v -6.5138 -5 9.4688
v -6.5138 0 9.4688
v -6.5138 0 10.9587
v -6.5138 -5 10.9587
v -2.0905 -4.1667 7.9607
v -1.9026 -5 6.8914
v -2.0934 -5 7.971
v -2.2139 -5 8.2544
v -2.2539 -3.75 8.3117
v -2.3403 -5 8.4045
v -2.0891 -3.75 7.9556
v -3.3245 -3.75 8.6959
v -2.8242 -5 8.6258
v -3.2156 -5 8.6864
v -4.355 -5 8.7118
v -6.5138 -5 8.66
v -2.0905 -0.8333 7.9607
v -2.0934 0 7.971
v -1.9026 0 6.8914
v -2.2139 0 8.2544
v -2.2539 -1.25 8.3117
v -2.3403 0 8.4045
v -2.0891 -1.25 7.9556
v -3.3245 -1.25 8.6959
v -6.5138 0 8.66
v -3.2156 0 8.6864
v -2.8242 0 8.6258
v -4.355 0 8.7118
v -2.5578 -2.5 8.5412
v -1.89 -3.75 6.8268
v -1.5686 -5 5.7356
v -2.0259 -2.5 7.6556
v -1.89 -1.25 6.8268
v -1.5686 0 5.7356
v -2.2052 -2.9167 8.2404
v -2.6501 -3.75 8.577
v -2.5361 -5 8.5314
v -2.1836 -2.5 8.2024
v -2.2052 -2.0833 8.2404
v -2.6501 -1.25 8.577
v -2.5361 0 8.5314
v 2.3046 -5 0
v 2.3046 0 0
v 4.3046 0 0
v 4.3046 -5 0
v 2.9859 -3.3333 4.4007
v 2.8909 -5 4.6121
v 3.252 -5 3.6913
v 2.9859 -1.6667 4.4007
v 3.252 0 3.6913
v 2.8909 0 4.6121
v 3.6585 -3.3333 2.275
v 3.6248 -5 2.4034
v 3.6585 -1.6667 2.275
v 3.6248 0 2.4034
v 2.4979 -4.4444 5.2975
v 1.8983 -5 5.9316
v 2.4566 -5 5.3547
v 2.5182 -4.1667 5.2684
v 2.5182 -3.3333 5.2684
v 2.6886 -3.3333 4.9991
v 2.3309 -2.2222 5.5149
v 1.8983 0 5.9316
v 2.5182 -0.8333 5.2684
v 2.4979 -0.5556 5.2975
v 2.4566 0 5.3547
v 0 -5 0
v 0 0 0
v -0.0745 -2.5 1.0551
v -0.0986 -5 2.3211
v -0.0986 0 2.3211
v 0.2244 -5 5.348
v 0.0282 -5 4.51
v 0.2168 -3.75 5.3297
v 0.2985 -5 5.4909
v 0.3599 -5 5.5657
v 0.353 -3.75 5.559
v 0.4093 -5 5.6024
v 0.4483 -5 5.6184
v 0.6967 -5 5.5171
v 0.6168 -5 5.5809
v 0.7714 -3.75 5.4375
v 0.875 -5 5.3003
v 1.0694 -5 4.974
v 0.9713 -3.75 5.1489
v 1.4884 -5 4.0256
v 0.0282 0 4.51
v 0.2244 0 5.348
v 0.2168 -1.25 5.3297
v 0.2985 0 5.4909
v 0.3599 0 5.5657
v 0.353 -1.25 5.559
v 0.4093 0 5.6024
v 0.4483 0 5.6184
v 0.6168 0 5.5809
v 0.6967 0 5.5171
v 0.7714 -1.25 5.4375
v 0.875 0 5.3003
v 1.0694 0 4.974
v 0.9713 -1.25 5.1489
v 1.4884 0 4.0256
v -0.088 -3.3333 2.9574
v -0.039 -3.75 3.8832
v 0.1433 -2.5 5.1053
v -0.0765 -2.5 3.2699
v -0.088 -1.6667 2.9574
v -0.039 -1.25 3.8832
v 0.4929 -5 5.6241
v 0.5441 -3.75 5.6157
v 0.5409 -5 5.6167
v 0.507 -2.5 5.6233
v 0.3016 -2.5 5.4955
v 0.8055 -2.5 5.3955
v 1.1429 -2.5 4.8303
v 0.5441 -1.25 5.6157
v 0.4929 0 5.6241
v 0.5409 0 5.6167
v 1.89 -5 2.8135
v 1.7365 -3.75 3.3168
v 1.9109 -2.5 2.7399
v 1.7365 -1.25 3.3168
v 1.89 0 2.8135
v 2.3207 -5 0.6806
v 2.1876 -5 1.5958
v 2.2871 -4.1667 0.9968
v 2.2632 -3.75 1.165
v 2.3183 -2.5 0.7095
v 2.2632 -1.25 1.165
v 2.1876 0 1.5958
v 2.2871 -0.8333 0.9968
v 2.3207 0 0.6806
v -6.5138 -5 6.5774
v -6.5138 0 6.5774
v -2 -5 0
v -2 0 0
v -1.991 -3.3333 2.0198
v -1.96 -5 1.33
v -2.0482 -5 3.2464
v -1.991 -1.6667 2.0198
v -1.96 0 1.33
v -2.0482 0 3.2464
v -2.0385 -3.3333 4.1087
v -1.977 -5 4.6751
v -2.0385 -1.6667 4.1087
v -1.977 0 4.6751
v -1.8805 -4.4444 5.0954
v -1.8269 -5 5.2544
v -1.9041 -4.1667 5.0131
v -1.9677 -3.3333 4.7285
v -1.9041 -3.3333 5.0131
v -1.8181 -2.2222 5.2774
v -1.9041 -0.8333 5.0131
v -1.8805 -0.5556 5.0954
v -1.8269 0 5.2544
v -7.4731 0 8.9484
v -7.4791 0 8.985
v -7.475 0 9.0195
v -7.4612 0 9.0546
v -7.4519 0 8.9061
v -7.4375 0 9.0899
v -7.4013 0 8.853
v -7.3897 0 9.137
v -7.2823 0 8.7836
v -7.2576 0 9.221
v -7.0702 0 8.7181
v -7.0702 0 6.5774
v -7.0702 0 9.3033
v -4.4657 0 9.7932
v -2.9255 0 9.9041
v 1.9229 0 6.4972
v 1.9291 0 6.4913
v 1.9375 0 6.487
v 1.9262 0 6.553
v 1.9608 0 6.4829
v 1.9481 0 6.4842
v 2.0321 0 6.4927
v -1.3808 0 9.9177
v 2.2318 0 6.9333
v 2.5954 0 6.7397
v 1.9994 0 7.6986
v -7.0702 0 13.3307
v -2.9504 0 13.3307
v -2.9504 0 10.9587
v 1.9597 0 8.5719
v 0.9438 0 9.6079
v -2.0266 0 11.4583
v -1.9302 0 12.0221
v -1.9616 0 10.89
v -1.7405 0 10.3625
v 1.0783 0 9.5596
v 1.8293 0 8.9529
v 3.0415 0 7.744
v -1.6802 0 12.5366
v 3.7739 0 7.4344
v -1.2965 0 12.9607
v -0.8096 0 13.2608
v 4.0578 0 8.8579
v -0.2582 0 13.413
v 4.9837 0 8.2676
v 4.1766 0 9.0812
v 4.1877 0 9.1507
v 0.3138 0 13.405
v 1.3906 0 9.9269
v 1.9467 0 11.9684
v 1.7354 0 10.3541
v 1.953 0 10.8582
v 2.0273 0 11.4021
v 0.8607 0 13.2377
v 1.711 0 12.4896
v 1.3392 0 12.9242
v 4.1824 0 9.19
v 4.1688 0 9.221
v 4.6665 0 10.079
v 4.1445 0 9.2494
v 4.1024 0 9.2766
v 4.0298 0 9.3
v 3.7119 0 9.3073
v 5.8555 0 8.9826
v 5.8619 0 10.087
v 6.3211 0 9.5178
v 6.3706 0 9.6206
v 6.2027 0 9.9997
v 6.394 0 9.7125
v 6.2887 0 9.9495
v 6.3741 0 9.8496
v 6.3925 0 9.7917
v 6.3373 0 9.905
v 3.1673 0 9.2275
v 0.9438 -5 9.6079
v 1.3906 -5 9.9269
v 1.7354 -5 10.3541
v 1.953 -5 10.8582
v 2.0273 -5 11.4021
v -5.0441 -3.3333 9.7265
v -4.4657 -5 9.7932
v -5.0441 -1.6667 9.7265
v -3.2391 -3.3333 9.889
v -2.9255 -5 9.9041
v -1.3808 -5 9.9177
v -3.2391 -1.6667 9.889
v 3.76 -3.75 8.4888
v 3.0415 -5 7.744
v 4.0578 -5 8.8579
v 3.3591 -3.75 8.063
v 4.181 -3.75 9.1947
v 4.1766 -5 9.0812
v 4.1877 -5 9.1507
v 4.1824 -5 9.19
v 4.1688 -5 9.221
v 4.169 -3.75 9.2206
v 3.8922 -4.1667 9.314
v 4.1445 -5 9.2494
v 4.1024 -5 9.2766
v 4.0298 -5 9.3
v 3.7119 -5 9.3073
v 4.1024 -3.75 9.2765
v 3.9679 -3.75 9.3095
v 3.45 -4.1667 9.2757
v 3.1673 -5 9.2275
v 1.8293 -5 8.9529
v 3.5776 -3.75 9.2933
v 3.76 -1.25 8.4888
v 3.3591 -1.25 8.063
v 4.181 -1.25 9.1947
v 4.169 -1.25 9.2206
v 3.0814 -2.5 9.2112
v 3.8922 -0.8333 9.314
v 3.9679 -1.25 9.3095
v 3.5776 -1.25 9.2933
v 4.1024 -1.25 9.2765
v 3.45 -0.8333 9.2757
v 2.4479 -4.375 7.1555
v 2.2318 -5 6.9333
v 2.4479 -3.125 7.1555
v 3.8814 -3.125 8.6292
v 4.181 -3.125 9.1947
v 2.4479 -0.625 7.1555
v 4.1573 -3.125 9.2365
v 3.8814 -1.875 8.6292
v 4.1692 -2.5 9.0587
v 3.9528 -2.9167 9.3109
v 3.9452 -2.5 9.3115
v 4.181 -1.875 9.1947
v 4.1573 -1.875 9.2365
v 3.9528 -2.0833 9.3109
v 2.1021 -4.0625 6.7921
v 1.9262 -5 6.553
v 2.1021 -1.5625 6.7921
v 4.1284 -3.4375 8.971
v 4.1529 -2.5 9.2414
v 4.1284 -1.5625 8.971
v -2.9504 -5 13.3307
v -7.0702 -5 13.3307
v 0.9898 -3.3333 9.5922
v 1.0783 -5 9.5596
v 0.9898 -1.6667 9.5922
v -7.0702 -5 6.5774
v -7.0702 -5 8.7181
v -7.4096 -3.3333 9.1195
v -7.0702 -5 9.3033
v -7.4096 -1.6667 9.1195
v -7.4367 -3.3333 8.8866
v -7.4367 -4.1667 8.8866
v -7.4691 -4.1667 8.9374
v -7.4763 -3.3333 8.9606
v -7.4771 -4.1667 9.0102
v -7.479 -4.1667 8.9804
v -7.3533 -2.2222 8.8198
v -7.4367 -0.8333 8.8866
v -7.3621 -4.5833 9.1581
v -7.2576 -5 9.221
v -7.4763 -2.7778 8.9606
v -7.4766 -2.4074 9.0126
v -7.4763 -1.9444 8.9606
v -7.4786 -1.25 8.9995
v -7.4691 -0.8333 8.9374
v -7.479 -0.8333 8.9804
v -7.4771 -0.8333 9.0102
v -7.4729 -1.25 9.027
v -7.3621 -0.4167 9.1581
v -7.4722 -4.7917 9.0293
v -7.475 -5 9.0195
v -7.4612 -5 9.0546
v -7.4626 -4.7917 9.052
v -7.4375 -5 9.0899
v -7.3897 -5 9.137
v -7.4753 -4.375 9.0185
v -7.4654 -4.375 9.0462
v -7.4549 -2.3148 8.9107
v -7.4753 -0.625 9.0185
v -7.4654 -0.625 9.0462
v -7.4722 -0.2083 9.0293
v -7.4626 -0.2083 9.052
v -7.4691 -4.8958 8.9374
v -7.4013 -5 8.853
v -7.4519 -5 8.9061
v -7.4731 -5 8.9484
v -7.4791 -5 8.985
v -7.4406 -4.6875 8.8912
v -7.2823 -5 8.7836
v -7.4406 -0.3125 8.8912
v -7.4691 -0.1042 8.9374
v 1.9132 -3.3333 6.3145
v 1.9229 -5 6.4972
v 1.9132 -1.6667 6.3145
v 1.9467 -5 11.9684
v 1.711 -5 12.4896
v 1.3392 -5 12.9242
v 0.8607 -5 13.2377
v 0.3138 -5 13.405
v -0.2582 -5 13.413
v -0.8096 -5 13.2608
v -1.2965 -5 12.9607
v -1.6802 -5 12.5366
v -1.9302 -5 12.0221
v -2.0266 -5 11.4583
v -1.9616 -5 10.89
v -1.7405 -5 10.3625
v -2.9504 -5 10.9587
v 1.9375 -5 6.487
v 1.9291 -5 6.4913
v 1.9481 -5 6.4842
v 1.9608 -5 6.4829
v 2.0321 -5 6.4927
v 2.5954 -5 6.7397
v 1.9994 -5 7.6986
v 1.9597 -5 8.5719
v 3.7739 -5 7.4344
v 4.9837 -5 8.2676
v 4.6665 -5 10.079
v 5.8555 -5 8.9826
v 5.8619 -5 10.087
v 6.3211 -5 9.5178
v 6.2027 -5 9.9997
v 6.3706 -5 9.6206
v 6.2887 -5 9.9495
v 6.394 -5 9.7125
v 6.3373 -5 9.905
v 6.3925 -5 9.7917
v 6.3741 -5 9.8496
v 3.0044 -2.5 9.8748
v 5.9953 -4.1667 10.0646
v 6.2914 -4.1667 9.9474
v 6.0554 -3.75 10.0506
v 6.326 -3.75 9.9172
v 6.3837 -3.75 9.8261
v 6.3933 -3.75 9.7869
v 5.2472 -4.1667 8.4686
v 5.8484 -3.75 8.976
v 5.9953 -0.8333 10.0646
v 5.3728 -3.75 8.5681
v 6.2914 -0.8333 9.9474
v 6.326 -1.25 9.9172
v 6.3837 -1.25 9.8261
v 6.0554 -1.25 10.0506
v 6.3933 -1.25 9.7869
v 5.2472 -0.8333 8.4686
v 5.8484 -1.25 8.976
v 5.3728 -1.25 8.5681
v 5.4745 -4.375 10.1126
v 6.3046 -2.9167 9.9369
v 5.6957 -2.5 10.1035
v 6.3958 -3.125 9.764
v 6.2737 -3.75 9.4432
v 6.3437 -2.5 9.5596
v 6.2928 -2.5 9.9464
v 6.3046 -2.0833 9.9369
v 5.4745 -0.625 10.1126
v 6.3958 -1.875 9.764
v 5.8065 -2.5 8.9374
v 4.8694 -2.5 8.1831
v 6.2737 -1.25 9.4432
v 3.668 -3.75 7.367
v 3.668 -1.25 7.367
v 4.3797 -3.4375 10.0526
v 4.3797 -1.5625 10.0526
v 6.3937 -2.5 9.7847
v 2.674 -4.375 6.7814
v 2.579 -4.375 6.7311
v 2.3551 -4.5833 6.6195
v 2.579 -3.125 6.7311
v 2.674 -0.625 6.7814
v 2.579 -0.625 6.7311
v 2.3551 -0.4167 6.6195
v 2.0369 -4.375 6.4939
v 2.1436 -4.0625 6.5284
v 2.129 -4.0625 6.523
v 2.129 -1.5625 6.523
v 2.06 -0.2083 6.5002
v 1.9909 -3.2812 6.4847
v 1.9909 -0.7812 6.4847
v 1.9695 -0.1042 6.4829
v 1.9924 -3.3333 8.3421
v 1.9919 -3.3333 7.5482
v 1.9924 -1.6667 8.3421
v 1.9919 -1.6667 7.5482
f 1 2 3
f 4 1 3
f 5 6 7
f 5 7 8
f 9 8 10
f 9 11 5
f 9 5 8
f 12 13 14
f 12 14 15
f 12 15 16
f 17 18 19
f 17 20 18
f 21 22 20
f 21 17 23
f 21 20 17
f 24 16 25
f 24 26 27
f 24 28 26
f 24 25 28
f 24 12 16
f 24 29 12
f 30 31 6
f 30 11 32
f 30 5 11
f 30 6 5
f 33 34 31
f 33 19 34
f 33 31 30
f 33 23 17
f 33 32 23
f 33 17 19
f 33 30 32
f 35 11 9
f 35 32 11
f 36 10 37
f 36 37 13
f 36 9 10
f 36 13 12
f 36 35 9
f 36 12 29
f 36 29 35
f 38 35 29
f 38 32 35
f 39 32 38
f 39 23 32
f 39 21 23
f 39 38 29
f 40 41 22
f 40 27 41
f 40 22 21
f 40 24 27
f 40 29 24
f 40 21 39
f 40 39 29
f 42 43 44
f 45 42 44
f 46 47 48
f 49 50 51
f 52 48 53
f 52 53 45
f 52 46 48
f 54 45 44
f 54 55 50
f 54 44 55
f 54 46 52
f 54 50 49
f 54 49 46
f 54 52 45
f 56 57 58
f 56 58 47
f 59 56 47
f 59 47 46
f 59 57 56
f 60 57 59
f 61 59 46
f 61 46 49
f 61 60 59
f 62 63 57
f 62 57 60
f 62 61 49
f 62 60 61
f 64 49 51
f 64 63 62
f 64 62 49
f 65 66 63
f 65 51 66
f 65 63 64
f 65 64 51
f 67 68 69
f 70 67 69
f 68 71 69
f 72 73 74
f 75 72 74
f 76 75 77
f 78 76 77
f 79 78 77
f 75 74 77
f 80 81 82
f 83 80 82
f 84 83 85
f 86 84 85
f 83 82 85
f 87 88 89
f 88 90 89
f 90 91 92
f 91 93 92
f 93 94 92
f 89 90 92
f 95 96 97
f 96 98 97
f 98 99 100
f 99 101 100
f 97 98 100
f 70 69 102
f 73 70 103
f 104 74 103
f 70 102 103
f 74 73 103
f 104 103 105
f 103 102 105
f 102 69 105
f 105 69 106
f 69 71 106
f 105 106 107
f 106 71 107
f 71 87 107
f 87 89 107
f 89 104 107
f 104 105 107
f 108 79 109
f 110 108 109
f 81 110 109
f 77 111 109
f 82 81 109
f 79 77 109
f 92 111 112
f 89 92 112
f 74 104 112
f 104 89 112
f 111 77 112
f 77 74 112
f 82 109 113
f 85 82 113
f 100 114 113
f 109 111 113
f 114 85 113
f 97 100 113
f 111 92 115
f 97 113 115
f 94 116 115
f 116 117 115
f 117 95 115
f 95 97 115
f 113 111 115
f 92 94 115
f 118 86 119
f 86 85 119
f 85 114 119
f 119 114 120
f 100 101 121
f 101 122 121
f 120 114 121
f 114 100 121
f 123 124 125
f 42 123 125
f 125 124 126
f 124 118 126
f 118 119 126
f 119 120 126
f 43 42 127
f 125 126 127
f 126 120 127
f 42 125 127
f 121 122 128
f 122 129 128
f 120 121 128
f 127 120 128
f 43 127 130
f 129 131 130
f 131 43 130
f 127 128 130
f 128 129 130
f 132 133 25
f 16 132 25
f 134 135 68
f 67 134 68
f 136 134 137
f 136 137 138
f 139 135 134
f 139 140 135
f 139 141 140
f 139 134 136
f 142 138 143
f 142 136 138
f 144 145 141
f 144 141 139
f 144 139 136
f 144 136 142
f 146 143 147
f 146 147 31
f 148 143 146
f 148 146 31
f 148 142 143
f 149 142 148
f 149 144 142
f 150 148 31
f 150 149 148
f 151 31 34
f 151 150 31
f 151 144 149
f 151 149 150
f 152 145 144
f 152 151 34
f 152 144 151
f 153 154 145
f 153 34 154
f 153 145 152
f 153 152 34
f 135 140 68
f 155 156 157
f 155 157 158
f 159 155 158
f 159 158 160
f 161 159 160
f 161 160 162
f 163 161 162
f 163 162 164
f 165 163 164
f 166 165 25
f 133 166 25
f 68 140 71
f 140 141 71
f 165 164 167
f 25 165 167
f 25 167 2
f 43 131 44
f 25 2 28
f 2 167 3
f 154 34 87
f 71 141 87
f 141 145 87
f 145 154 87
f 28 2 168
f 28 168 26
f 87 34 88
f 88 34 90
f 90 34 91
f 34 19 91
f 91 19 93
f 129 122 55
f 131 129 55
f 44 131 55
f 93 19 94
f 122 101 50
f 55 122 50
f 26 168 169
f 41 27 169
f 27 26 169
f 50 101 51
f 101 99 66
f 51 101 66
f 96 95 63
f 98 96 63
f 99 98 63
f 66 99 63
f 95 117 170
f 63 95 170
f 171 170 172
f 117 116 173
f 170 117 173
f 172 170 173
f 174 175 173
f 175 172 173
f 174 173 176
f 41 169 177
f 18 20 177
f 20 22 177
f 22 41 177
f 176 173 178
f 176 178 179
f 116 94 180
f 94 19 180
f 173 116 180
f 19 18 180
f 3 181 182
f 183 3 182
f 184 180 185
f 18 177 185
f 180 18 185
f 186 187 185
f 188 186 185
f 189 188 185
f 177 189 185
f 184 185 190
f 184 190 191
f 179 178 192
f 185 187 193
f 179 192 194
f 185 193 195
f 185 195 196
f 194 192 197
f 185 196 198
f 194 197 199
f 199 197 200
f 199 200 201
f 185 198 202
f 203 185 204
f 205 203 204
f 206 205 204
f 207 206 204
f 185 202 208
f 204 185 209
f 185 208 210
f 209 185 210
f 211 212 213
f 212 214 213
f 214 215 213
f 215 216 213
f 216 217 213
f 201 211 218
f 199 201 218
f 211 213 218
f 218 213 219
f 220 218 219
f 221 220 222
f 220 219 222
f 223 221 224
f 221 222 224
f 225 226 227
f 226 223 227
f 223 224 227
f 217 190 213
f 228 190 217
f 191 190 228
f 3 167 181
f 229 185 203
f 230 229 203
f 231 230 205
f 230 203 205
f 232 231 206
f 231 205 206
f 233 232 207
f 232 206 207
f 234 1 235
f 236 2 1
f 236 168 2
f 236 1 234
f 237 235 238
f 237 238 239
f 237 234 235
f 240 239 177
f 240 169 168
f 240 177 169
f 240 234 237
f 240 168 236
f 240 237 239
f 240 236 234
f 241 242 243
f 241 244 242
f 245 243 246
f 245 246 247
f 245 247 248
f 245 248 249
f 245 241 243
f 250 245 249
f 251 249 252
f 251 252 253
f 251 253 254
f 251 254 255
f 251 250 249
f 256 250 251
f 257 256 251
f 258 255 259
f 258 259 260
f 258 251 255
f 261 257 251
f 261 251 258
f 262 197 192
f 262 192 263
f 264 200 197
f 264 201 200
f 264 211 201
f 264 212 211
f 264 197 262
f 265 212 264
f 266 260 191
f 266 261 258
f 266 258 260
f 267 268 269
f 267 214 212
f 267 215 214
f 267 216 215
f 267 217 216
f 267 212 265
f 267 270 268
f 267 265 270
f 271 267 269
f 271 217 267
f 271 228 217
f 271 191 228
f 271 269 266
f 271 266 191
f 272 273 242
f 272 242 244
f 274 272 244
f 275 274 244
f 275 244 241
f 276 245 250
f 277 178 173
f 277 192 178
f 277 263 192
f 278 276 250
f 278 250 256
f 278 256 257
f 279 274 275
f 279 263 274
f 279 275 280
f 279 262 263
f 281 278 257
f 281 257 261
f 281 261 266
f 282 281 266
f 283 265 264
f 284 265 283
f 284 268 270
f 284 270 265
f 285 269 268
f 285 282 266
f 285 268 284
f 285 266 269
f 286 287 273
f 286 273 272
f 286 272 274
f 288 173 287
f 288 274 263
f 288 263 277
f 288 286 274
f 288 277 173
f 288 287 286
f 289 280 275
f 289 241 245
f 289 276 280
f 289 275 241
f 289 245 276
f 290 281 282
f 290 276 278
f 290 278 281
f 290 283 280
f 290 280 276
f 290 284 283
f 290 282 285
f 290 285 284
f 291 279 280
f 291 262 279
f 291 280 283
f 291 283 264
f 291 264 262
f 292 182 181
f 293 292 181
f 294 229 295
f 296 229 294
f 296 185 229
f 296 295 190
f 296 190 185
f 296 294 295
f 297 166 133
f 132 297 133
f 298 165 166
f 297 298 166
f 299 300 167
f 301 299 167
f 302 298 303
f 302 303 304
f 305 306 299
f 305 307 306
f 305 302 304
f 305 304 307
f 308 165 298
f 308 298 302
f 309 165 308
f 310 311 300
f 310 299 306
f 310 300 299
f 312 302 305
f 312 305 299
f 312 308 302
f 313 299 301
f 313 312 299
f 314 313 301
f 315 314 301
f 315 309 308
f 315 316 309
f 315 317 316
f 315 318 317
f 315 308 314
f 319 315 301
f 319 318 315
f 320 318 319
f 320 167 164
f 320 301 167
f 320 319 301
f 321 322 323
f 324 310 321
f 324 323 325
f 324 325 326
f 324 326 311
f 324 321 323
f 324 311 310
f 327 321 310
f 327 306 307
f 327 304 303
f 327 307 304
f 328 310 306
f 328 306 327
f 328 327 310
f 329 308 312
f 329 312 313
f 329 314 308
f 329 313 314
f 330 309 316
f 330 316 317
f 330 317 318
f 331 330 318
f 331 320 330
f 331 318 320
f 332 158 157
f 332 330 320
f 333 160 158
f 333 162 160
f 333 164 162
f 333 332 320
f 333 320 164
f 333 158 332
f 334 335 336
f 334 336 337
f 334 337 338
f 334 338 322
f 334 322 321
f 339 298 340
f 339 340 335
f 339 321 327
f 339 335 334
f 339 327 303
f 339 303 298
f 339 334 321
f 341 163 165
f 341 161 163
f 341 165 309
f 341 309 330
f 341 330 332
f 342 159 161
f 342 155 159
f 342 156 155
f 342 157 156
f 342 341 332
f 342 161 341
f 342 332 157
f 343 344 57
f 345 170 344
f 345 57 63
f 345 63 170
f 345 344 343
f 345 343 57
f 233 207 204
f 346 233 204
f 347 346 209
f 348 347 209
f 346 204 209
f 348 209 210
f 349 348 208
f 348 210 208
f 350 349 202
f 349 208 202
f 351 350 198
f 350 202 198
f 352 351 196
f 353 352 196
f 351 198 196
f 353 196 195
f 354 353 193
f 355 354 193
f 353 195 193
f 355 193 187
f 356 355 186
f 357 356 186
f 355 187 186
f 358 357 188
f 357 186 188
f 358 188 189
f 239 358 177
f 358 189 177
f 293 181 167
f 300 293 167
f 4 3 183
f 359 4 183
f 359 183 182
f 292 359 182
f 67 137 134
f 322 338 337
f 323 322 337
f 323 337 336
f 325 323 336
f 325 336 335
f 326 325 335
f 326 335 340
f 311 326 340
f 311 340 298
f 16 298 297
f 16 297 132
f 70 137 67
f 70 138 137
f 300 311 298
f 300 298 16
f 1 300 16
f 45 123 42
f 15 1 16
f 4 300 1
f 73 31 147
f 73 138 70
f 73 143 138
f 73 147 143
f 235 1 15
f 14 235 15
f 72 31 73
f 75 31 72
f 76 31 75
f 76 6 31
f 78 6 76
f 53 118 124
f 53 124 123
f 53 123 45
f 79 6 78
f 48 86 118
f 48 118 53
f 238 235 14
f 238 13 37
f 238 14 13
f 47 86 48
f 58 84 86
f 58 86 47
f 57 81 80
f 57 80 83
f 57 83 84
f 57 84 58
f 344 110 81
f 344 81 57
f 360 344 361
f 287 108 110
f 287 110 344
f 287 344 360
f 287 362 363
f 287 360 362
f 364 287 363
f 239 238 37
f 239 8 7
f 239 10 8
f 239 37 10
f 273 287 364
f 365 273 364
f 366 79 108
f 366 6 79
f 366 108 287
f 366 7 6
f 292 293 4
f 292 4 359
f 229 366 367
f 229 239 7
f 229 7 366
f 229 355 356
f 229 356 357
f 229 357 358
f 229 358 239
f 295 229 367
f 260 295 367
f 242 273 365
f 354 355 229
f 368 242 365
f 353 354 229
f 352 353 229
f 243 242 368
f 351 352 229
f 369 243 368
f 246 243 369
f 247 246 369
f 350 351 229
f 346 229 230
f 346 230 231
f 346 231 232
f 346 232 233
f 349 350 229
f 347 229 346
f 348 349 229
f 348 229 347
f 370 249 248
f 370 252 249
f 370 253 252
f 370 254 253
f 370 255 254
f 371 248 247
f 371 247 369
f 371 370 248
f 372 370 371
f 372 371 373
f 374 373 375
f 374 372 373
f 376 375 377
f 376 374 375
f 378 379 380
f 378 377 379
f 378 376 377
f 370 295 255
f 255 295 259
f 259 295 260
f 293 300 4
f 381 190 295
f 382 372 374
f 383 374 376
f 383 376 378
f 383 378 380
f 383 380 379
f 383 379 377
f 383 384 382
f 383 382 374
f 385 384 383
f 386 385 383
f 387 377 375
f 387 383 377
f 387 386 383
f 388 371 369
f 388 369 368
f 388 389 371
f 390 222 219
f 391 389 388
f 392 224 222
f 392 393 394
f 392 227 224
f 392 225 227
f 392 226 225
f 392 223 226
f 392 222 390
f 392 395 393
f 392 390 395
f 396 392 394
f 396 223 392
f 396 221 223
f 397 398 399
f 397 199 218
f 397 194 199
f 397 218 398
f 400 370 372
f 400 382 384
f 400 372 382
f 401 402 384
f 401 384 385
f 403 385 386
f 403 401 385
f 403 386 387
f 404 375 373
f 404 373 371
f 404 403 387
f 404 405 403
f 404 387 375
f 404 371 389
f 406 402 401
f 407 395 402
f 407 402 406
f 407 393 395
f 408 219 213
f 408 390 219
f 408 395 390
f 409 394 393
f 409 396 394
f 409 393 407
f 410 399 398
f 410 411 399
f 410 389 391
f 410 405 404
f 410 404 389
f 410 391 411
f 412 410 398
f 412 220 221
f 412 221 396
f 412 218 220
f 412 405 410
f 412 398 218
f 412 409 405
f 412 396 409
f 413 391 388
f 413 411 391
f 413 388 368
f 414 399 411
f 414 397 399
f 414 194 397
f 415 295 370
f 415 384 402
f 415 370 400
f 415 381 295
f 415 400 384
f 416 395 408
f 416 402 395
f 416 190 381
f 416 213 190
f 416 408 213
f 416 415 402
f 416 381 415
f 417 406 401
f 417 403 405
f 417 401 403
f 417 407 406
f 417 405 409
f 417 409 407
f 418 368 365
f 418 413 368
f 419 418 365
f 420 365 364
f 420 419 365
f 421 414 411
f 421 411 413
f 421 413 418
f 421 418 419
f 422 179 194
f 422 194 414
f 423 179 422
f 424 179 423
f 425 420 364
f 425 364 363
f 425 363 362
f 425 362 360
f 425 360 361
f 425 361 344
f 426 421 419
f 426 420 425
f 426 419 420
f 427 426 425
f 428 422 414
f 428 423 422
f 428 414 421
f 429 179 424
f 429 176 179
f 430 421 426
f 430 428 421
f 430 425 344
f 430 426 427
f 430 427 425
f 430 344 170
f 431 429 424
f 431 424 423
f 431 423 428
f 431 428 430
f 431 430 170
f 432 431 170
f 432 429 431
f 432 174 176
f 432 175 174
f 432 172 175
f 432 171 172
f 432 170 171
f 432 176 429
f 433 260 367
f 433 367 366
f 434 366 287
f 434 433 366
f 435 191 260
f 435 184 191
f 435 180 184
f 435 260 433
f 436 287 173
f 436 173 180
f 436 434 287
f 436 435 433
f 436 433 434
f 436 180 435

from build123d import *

# Parameters (mm, degrees)
F0_W     = 3.5634012893
F0_H     = 2.3720003664
F1_DEPTH = 5


with BuildPart() as f1:
    # F0 (on Front) → F1 (new body)
    with BuildSketch(Plane.XZ):
        with BuildLine():
            Line((-2, 0), (0, 0))
            add(Edge.make_bspline(
                [(0, 0), (-0.1836561132, 1.7094361829), (-0.1397413061, 9.7580692578), (2.5518890591, 1.2595293557), (2.3045632429, 0)],
                knots=[0, 0, 0, 0, 0.4944254575, 1, 1, 1, 1], degree=3))
            Line((2.3045632429, 0), (4.3045632429, 0))
            add(Edge.make_bspline(
                [(1.898295837, 5.931569832), (3.3228321005, 4.8468001157), (3.5423423469, 2.2009662159), (4.3045632429, 0)],
                knots=[0.627484657, 0.627484657, 0.627484657, 0.627484657, 1, 1, 1, 1], degree=3))
            add(Edge.make_bspline(
                [(-1.5685537924, 5.7355813877), (-0.8538090003, 6.6826607519), (0.8490885432, 6.7305303973), (1.898295837, 5.931569832)],
                knots=[0.3531176051, 0.3531176051, 0.3531176051, 0.3531176051, 0.627484657, 0.627484657, 0.627484657, 0.627484657], degree=3))
            add(Edge.make_bspline(
                [(-2, 0), (-1.77153203, 1.8082654117), (-2.4884491206, 4.5166653604), (-1.5685537924, 5.7355813877)],
                knots=[0, 0, 0, 0, 0.3531176051, 0.3531176051, 0.3531176051, 0.3531176051], degree=3))
        make_face()
        with BuildLine():
            add(Edge.make_bspline(
                [(-1.5685537924, 5.7355813877), (-2.1986037273, 7.3149230589), (-1.4040608509, 9.1362467506), (-5.3149314083, 8.6162903235), (-6.5138074569, 8.659985655)],
                knots=[0, 0, 0, 0, 0.1835397267, 0.372551207, 0.372551207, 0.372551207, 0.372551207], degree=3))
            add(Edge.make_bspline(
                [(-1.5685537924, 5.7355813877), (-0.8538090003, 6.6826607519), (0.8490885432, 6.7305303973), (1.898295837, 5.931569832)],
                knots=[0.3531176051, 0.3531176051, 0.3531176051, 0.3531176051, 0.627484657, 0.627484657, 0.627484657, 0.627484657], degree=3))
            add(Edge.make_bspline(
                [(1.9229257877, 6.4971952265), (1.9126104325, 6.3173946518), (1.903779138, 6.1289676696), (1.898295837, 5.931569832)],
                knots=[0.9801694628, 0.9801694628, 0.9801694628, 0.9801694628, 1, 1, 1, 1], degree=3))
            add(Edge.make_bspline(
                [(1.9229257877, 6.4971952265), (1.9141740763, 6.5088301842), (1.9156850526, 6.5277113359), (1.9261891554, 6.5529953329)],
                knots=[0.577436763, 0.577436763, 0.577436763, 0.577436763, 0.5928976619, 0.5928976619, 0.5928976619, 0.5928976619], degree=3))
            add(Edge.make_bspline(
                [(1.8293032252, 8.9529328765), (2.1069112235, 8.4276675068), (1.9918291417, 7.6549231128), (1.9261891554, 6.5529953329)],
                knots=[0.8553520328, 0.8553520328, 0.8553520328, 0.8553520328, 0.978107761, 0.978107761, 0.978107761, 0.978107761], degree=3))
            add(Edge.make_bspline(
                [(1.0782698656, 9.5595878301), (1.4596732733, 9.4110932651), (1.6923053765, 9.2121481228), (1.8293032252, 8.9529328765)],
                knots=[0.7947728319, 0.7947728319, 0.7947728319, 0.7947728319, 0.8553520328, 0.8553520328, 0.8553520328, 0.8553520328], degree=3))
            add(Edge.make_bspline(
                [(0.9437969367, 9.6078676818), (0.9904450196, 9.5924058566), (1.0353015402, 9.576317001), (1.0782698656, 9.5595878301)],
                knots=[0.7879480717, 0.7879480717, 0.7879480717, 0.7879480717, 0.7947728319, 0.7947728319, 0.7947728319, 0.7947728319], degree=3))
            ThreePointArc((0.9437969367, 9.6078676818), (-0.2678500801, 9.3925558637), (-1.3808027632, 9.9177072682))
            add(Edge.make_bspline(
                [(-6.5138074569, 9.4688323455), (-5.3055520235, 9.7611397753), (-3.1719225069, 9.9688662745), (-1.3808027632, 9.9177072682)],
                knots=[0.5439344229, 0.5439344229, 0.5439344229, 0.5439344229, 0.7049021627, 0.7049021627, 0.7049021627, 0.7049021627], degree=3))
            Line((-6.5138074569, 9.4688323455), (-6.5138074569, 8.659985655))
        make_face()
        with BuildLine():
            Line((-6.5138074569, 6.5773790702), (-6.5138074569, 8.659985655))
            add(Edge.make_bspline(
                [(-6.5138074569, 8.659985655), (-6.7281794928, 8.667798854), (-6.9174435476, 8.6854435894), (-7.0701856166, 8.7181232441)],
                knots=[0.372551207, 0.372551207, 0.372551207, 0.372551207, 0.4063485089, 0.4063485089, 0.4063485089, 0.4063485089], degree=3))
            Line((-7.0701856166, 8.7181232441), (-7.0701856166, 6.5773790702))
            Line((-7.0701856166, 6.5773790702), (-6.5138074569, 6.5773790702))
        make_face()
        with BuildLine():
            add(Edge.make_bspline(
                [(-6.5138074569, 8.659985655), (-6.7281794928, 8.667798854), (-6.9174435476, 8.6854435894), (-7.0701856166, 8.7181232441)],
                knots=[0.372551207, 0.372551207, 0.372551207, 0.372551207, 0.4063485089, 0.4063485089, 0.4063485089, 0.4063485089], degree=3))
            Line((-6.5138074569, 8.659985655), (-6.5138074569, 9.4688323455))
            add(Edge.make_bspline(
                [(-7.0701856166, 9.3033018375), (-6.9198476576, 9.360551064), (-6.7319027313, 9.416069604), (-6.5138074569, 9.4688323455)],
                knots=[0.5148790573, 0.5148790573, 0.5148790573, 0.5148790573, 0.5439344229, 0.5439344229, 0.5439344229, 0.5439344229], degree=3))
            Line((-7.0701856166, 9.3033018375), (-7.0701856166, 8.7181232441))
        make_face()
        with BuildLine():
            add(Edge.make_bspline(
                [(1.9229257877, 6.4971952265), (1.9141740763, 6.5088301842), (1.9156850526, 6.5277113359), (1.9261891554, 6.5529953329)],
                knots=[0.577436763, 0.577436763, 0.577436763, 0.577436763, 0.5928976619, 0.5928976619, 0.5928976619, 0.5928976619], degree=3))
            add(Edge.make_bspline(
                [(1.9261891554, 6.5529953329), (1.9250867215, 6.5344882817), (1.923998234, 6.5158883752), (1.9229257877, 6.4971952265)],
                knots=[0.978107761, 0.978107761, 0.978107761, 0.978107761, 0.9801694628, 0.9801694628, 0.9801694628, 0.9801694628], degree=3))
        make_face()
        with BuildLine():
            add(Edge.make_bspline(
                [(1.9261891554, 6.5529953329), (1.9250867215, 6.5344882817), (1.923998234, 6.5158883752), (1.9229257877, 6.4971952265)],
                knots=[0.978107761, 0.978107761, 0.978107761, 0.978107761, 0.9801694628, 0.9801694628, 0.9801694628, 0.9801694628], degree=3))
            add(Edge.make_bspline(
                [(1.0782698656, 9.5595878301), (4.0481531599, 10.0701912701), (9.609540077, 10.9247415729), (2.0872194249, 6.2787751448), (1.9229257877, 6.4971952265)],
                knots=[0, 0, 0, 0, 0.2871932674, 0.577436763, 0.577436763, 0.577436763, 0.577436763], degree=3))
            add(Edge.make_bspline(
                [(1.0782698656, 9.5595878301), (1.4596732733, 9.4110932651), (1.6923053765, 9.2121481228), (1.8293032252, 8.9529328765)],
                knots=[0.7947728319, 0.7947728319, 0.7947728319, 0.7947728319, 0.8553520328, 0.8553520328, 0.8553520328, 0.8553520328], degree=3))
            add(Edge.make_bspline(
                [(1.9261891554, 6.5529953329), (2.0726362175, 6.9055020769), (5.6506443881, 9.9217752461), (3.1918898004, 9.2252642405), (1.8293032252, 8.9529328765)],
                knots=[0.5928976619, 0.5928976619, 0.5928976619, 0.5928976619, 0.8084518359, 1, 1, 1, 1], degree=3))
        make_face()
        with BuildLine():
            add(Edge.make_bspline(
                [(-7.0701856166, 8.7181232441), (-7.0925674088, 8.7229119002), (-7.4335820034, 8.8036195657), (-7.6231094084, 9.0330063205), (-7.2271410881, 9.2435326388), (-7.0701856166, 9.3033018375)],
                knots=[0.4063485089, 0.4063485089, 0.4063485089, 0.4063485089, 0.4113009375, 0.4845447449, 0.5148790573, 0.5148790573, 0.5148790573, 0.5148790573], degree=3))
            Line((-7.0701856166, 8.7181232441), (-7.0701856166, 9.3033018375))
        make_face()
        with BuildLine():
            add(Edge.make_bspline(
                [(-7.0701856166, 9.3033018375), (-6.9198476576, 9.360551064), (-6.7319027313, 9.416069604), (-6.5138074569, 9.4688323455)],
                knots=[0.5148790573, 0.5148790573, 0.5148790573, 0.5148790573, 0.5439344229, 0.5439344229, 0.5439344229, 0.5439344229], degree=3))
            Line((-6.5138074569, 9.4688323455), (-6.5138074569, 10.958660394))
            Line((-6.5138074569, 10.958660394), (-6.5138074569, 13.3306607604))
            Line((-6.5138074569, 13.3306607604), (-7.0701856166, 13.3306607604))
            Line((-7.0701856166, 13.3306607604), (-7.0701856166, 9.3033018375))
        make_face()
        with BuildLine():
            ThreePointArc((2.0273415276, 11.4021254703), (-0.8095538544, 13.2608175444), (-1.3808027632, 9.9177072682))
            add(Edge.make_bspline(
                [(-1.3808027632, 9.9177072682), (-0.4567345775, 9.891313494), (0.376167847, 9.796012214), (0.9437969367, 9.6078676818)],
                knots=[0.7049021627, 0.7049021627, 0.7049021627, 0.7049021627, 0.7879480717, 0.7879480717, 0.7879480717, 0.7879480717], degree=3))
            ThreePointArc((0.9437969367, 9.6078676818), (1.7354412109, 10.3540999587), (2.0273415276, 11.4021254703))
        make_face()
        with BuildLine():
            add(Edge.make_bspline(
                [(-1.3808027632, 9.9177072682), (-0.4567345775, 9.891313494), (0.376167847, 9.796012214), (0.9437969367, 9.6078676818)],
                knots=[0.7049021627, 0.7049021627, 0.7049021627, 0.7049021627, 0.7879480717, 0.7879480717, 0.7879480717, 0.7879480717], degree=3))
            ThreePointArc((-1.3808027632, 9.9177072682), (-0.2678500801, 9.3925558637), (0.9437969367, 9.6078676818))
        make_face()
        with Locations((-4.7321068123, 12.1446605772)):
            Rectangle(F0_W, F0_H)
    extrude(amount=F1_DEPTH)


solid = f1.part
